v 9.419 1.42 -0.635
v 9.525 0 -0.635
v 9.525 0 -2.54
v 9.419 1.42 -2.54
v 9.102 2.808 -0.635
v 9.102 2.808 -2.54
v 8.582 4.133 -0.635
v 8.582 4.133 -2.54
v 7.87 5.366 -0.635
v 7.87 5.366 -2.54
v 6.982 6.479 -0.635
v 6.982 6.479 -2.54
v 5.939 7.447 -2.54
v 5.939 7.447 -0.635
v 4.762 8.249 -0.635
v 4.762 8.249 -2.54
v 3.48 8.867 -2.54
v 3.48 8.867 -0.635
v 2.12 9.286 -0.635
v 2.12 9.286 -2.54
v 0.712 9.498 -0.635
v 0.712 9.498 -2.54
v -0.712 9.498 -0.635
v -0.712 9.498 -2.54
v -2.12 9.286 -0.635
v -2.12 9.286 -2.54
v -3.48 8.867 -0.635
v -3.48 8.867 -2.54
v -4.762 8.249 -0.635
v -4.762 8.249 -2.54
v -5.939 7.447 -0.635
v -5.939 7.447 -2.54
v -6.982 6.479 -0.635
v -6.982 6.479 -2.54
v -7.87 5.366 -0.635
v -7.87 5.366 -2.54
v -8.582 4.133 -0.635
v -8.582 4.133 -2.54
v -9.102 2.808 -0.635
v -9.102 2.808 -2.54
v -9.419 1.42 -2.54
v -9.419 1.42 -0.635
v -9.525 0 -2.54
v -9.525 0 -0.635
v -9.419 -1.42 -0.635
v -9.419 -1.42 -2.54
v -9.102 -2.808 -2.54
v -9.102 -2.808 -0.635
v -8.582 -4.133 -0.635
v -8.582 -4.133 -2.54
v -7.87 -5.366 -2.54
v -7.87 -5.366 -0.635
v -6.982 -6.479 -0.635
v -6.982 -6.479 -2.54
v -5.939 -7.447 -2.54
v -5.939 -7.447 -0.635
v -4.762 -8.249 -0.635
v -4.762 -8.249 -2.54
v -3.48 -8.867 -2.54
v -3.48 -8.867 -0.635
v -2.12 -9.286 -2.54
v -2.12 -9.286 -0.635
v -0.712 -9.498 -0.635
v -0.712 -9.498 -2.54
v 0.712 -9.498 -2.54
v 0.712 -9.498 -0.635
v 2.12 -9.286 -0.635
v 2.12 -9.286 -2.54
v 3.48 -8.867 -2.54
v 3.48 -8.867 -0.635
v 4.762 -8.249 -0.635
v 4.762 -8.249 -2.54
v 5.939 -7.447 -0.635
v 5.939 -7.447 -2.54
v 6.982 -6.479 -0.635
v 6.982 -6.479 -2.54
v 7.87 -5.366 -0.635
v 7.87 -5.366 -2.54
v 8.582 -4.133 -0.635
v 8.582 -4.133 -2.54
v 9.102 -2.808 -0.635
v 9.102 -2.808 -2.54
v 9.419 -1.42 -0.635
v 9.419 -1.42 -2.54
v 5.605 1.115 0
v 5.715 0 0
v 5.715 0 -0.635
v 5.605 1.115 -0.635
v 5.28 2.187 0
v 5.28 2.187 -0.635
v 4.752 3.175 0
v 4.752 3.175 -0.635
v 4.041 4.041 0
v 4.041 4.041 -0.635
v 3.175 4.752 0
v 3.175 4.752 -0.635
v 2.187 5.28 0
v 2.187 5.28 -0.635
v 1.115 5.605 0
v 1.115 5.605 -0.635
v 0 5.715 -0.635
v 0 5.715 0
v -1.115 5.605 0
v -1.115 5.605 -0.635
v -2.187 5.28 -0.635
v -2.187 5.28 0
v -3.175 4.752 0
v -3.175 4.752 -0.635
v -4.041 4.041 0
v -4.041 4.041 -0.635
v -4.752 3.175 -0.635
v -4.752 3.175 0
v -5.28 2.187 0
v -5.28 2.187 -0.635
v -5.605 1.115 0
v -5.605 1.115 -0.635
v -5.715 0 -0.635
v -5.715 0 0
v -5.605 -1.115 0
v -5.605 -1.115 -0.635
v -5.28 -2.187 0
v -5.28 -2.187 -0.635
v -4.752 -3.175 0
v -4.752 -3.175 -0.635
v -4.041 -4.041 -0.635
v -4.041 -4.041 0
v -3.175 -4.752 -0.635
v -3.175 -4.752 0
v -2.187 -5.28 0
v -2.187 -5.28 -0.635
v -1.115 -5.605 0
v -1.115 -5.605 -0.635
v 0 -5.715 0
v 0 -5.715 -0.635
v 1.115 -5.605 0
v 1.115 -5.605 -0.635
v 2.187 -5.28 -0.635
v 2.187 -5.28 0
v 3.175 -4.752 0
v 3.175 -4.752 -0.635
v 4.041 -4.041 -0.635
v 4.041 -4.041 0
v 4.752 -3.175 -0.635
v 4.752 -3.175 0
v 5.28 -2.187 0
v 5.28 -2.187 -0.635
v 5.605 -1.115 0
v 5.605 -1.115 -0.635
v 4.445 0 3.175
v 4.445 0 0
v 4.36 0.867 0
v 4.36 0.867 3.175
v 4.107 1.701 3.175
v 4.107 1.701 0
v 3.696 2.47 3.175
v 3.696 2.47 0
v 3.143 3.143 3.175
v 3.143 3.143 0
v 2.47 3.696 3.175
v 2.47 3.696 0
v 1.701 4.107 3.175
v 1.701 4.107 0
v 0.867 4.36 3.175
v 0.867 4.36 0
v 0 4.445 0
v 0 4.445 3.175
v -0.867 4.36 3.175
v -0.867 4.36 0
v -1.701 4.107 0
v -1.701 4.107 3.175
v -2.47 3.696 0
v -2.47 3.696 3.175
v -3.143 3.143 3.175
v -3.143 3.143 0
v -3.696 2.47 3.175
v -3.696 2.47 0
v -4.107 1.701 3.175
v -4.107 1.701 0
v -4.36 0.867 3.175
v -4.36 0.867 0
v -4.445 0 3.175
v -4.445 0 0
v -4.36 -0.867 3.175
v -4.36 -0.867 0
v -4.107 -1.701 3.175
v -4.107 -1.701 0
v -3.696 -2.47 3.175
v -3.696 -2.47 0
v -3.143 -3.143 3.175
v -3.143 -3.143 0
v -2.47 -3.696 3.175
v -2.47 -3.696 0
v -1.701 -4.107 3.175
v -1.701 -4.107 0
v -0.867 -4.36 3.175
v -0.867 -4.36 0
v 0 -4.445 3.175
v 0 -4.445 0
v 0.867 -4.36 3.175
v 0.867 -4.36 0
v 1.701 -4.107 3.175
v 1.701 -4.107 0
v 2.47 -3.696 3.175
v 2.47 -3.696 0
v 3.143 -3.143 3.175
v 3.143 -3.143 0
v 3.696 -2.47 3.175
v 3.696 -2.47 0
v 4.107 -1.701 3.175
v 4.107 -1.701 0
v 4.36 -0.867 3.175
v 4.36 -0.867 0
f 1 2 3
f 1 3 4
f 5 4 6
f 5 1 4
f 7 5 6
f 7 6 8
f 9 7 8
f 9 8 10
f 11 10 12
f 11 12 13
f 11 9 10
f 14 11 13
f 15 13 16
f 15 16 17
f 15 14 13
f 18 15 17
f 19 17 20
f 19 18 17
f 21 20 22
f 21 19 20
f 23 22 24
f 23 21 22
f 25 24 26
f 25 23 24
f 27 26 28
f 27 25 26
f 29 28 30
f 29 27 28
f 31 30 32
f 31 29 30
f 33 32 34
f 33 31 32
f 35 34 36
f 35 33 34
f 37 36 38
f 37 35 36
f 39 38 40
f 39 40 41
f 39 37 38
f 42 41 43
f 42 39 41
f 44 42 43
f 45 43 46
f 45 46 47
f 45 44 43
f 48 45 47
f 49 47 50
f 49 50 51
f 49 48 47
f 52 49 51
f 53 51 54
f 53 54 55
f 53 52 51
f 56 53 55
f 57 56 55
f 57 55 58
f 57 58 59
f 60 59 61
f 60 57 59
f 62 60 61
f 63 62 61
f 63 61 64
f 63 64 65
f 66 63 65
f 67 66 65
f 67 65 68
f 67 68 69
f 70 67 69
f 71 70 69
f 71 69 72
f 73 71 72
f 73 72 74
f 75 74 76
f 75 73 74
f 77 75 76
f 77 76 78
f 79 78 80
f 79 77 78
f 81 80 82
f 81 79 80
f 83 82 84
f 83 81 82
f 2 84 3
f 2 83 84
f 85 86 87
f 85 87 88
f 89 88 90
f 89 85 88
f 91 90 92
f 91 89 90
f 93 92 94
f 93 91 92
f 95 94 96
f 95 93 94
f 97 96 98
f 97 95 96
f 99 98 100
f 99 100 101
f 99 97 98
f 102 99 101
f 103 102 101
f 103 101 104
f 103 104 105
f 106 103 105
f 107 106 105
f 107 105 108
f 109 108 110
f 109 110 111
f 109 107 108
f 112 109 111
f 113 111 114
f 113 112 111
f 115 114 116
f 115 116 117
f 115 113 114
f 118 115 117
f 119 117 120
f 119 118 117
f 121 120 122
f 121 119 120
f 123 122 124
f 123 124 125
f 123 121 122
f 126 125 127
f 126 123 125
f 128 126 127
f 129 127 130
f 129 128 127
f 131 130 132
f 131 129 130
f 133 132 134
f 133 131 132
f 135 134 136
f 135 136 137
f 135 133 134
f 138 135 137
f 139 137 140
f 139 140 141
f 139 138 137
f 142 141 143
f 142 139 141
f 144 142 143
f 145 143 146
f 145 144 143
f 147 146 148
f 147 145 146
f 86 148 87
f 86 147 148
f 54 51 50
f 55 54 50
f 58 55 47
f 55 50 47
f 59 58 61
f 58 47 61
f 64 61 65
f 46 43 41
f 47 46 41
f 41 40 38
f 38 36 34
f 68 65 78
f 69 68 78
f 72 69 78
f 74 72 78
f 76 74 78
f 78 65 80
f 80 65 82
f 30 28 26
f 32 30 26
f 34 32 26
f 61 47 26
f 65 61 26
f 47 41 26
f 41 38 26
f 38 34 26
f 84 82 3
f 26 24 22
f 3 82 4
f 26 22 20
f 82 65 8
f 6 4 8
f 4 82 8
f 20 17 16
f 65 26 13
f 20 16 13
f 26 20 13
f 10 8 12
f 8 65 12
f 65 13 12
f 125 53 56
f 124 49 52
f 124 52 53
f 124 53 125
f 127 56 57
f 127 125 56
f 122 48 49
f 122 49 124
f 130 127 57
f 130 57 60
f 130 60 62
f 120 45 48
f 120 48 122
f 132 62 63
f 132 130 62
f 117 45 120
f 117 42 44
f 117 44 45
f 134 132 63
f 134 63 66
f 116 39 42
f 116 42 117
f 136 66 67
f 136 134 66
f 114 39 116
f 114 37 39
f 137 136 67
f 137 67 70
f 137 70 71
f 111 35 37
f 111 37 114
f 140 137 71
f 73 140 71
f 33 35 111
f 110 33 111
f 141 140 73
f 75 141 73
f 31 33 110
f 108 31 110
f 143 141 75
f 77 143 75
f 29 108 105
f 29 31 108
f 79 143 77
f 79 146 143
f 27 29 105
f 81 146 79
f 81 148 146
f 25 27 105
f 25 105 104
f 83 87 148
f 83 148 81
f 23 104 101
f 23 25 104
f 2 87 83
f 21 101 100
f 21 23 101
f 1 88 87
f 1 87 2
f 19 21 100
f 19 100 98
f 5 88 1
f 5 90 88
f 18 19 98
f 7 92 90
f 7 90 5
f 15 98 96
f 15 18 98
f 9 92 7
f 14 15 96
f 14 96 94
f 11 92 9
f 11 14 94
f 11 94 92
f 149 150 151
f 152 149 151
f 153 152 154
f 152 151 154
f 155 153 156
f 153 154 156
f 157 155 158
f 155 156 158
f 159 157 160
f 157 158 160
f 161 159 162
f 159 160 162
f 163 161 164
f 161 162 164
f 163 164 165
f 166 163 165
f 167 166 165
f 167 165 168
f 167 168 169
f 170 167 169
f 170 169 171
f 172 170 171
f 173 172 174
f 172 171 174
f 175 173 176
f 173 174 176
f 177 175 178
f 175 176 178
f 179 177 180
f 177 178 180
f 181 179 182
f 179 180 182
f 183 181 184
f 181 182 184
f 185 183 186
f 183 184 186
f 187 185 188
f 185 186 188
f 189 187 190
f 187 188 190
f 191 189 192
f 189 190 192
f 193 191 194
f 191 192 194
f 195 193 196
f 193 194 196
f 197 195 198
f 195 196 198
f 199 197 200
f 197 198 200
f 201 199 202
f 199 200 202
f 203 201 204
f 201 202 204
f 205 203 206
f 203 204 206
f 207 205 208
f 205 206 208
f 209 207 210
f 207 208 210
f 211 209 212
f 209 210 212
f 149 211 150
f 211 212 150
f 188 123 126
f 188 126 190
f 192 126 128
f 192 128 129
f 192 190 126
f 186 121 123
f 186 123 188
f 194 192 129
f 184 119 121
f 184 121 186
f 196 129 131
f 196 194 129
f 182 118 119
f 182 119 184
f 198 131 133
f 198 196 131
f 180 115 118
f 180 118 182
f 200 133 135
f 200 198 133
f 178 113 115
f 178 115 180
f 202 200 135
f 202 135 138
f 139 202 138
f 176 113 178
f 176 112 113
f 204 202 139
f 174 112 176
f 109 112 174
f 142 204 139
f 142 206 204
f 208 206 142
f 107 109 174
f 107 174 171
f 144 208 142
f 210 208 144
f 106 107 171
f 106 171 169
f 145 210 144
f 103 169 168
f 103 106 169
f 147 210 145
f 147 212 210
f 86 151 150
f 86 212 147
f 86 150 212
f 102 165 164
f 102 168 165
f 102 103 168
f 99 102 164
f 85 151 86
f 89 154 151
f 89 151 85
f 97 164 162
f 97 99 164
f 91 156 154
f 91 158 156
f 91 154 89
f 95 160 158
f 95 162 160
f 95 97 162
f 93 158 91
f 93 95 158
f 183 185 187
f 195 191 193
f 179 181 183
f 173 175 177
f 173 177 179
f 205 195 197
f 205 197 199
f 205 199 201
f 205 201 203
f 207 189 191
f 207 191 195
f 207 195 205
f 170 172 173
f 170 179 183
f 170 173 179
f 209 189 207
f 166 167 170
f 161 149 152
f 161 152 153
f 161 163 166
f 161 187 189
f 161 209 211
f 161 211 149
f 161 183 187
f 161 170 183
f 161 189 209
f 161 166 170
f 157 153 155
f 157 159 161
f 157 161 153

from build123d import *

# Parameters (mm, degrees)
F0_R     = 4.445
F1_DEPTH = 3.175
F0_R_2   = 5.715
F2_DEPTH = 0.635
F3_START = -0.635
F0_R_3   = 9.525
F3_DEPTH = 1.905


with BuildPart() as f1:
    # F0 (on Top) → F1 (new body)
    with BuildSketch(Plane.XY):
        Circle(F0_R)
    extrude(amount=F1_DEPTH)

    # F0 (on Top) → F2 (join)
    with BuildSketch(Plane.XY):
        Circle(F0_R_2)
        Circle(F0_R, mode=Mode.SUBTRACT)
        Circle(F0_R)
    extrude(amount=-F2_DEPTH)

    # F0 (on Top) → F3 (join)
    with BuildSketch(Plane.XY.offset(F3_START)):
        Circle(F0_R_3)
        Circle(F0_R_2, mode=Mode.SUBTRACT)
        Circle(F0_R_2)
        Circle(F0_R, mode=Mode.SUBTRACT)
        Circle(F0_R)
    extrude(amount=-F3_DEPTH)


solid = f1.part
